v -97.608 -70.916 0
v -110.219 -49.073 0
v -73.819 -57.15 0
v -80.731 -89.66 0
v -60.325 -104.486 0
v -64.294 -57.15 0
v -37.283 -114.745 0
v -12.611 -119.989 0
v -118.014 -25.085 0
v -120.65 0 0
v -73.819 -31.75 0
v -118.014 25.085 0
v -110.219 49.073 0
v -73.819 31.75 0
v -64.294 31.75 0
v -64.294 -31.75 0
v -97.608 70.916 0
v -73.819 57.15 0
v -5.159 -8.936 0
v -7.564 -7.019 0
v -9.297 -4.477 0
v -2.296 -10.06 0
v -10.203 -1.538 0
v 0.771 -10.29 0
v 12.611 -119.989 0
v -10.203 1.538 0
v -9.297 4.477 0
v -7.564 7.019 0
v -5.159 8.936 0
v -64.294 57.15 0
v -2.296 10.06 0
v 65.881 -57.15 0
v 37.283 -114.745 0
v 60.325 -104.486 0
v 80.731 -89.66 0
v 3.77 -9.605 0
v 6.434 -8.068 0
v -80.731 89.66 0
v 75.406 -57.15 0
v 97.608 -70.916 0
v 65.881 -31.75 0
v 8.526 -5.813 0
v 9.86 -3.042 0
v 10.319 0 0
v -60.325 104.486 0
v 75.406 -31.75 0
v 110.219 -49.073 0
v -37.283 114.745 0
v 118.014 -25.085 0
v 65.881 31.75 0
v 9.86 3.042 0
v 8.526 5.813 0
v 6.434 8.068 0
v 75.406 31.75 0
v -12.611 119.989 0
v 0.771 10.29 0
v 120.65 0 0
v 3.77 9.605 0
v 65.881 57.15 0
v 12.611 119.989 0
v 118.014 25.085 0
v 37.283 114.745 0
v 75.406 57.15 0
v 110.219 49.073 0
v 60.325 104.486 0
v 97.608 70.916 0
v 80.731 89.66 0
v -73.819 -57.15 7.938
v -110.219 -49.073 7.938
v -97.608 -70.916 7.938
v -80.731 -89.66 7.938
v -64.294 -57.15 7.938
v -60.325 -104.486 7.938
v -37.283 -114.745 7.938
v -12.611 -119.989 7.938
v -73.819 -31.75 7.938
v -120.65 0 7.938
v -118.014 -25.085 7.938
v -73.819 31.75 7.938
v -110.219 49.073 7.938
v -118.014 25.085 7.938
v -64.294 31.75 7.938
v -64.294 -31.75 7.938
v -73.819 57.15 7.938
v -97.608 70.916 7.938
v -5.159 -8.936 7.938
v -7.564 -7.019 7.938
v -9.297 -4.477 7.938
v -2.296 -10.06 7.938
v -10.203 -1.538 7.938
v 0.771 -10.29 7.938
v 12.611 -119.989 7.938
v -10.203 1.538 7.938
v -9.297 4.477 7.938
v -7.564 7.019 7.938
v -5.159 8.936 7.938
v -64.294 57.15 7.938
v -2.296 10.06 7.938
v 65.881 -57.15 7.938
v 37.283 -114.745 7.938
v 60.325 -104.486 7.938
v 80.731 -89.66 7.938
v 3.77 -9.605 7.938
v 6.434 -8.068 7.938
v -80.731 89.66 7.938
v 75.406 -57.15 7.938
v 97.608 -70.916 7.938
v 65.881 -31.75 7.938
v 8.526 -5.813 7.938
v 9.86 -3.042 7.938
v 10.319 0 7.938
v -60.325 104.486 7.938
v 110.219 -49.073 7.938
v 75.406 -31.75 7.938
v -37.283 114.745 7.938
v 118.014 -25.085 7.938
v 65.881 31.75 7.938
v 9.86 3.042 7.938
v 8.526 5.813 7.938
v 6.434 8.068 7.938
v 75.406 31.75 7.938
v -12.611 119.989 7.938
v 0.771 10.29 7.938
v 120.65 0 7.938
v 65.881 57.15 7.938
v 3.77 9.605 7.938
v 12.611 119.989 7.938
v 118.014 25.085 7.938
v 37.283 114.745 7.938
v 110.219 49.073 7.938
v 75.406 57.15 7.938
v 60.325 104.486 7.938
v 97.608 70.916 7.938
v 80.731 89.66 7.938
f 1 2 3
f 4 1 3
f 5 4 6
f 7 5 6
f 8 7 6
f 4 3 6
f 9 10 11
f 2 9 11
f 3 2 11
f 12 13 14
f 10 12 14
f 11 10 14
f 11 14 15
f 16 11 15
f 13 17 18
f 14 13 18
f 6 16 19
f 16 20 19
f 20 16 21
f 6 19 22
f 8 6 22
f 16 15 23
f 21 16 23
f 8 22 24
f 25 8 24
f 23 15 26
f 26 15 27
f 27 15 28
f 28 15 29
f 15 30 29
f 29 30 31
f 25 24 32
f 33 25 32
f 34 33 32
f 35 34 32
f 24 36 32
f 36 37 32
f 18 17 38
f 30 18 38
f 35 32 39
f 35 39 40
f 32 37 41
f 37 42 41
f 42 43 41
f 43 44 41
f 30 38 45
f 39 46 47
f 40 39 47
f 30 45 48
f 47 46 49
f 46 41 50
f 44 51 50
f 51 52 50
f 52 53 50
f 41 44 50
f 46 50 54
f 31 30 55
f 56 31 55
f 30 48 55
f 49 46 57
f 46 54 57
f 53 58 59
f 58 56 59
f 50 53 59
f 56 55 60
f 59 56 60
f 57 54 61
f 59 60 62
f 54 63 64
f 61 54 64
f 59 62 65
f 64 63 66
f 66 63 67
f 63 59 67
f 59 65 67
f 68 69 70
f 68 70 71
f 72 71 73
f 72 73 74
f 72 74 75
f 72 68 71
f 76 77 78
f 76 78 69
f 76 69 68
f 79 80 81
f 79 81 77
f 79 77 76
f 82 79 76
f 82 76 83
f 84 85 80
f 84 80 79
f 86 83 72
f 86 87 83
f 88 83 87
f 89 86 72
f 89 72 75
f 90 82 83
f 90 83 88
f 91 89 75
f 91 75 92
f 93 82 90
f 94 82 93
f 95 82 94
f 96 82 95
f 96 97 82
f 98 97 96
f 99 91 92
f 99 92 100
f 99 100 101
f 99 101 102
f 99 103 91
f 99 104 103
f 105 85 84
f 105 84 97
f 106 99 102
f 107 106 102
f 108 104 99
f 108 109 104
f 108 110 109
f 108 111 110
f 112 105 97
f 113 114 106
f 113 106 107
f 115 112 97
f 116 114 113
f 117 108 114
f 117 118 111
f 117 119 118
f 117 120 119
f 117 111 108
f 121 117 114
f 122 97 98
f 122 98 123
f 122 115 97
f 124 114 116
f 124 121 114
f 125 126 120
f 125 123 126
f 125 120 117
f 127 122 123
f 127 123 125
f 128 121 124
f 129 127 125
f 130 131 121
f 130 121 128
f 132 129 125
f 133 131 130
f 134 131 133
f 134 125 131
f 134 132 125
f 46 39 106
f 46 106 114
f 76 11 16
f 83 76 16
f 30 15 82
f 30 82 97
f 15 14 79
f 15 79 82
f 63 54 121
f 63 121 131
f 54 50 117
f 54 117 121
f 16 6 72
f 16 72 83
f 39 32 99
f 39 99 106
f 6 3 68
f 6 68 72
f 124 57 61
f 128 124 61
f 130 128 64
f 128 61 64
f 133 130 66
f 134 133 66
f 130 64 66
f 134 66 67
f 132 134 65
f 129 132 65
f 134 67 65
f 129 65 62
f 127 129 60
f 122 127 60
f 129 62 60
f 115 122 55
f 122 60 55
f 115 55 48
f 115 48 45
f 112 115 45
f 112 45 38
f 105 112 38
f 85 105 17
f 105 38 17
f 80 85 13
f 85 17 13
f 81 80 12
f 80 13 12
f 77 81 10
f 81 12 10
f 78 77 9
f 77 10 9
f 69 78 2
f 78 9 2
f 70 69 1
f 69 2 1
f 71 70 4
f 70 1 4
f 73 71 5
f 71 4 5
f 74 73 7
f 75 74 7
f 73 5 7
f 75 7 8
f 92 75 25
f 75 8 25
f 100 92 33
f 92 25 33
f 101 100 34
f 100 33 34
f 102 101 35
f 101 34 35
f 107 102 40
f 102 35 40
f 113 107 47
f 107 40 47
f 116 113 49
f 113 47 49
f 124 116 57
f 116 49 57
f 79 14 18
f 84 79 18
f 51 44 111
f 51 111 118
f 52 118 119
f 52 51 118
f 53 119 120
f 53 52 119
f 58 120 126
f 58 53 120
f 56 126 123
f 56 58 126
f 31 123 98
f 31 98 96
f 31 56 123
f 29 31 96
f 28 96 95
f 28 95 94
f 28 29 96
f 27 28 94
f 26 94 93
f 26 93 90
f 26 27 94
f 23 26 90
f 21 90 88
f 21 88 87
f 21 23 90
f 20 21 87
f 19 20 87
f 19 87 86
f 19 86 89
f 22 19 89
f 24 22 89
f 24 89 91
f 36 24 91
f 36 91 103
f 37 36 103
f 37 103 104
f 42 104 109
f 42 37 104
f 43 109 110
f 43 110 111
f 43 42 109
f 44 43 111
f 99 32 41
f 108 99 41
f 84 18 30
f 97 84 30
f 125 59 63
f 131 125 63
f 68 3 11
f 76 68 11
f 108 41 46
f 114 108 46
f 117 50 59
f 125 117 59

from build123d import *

# Parameters (mm, degrees)
F0_R     = 120.65
F0_W     = 9.525
F0_H     = 25.4
F0_R_2   = 10.31875
F1_DEPTH = 7.9375


with BuildPart() as f1:
    # F0 (on Top) → F1 (new body)
    with BuildSketch(Plane.XY):
        Circle(F0_R)
        with Locations((-69.05625, -44.45)):
            Rectangle(F0_W, F0_H, mode=Mode.SUBTRACT)
        with Locations((70.64375, -44.45)):
            Rectangle(F0_W, F0_H, mode=Mode.SUBTRACT)
        with Locations((-69.05625, 44.45)):
            Rectangle(F0_W, F0_H, mode=Mode.SUBTRACT)
        Circle(F0_R_2, mode=Mode.SUBTRACT)
        with Locations((70.64375, 44.45)):
            Rectangle(F0_W, F0_H, mode=Mode.SUBTRACT)
    extrude(amount=F1_DEPTH)


solid = f1.part
